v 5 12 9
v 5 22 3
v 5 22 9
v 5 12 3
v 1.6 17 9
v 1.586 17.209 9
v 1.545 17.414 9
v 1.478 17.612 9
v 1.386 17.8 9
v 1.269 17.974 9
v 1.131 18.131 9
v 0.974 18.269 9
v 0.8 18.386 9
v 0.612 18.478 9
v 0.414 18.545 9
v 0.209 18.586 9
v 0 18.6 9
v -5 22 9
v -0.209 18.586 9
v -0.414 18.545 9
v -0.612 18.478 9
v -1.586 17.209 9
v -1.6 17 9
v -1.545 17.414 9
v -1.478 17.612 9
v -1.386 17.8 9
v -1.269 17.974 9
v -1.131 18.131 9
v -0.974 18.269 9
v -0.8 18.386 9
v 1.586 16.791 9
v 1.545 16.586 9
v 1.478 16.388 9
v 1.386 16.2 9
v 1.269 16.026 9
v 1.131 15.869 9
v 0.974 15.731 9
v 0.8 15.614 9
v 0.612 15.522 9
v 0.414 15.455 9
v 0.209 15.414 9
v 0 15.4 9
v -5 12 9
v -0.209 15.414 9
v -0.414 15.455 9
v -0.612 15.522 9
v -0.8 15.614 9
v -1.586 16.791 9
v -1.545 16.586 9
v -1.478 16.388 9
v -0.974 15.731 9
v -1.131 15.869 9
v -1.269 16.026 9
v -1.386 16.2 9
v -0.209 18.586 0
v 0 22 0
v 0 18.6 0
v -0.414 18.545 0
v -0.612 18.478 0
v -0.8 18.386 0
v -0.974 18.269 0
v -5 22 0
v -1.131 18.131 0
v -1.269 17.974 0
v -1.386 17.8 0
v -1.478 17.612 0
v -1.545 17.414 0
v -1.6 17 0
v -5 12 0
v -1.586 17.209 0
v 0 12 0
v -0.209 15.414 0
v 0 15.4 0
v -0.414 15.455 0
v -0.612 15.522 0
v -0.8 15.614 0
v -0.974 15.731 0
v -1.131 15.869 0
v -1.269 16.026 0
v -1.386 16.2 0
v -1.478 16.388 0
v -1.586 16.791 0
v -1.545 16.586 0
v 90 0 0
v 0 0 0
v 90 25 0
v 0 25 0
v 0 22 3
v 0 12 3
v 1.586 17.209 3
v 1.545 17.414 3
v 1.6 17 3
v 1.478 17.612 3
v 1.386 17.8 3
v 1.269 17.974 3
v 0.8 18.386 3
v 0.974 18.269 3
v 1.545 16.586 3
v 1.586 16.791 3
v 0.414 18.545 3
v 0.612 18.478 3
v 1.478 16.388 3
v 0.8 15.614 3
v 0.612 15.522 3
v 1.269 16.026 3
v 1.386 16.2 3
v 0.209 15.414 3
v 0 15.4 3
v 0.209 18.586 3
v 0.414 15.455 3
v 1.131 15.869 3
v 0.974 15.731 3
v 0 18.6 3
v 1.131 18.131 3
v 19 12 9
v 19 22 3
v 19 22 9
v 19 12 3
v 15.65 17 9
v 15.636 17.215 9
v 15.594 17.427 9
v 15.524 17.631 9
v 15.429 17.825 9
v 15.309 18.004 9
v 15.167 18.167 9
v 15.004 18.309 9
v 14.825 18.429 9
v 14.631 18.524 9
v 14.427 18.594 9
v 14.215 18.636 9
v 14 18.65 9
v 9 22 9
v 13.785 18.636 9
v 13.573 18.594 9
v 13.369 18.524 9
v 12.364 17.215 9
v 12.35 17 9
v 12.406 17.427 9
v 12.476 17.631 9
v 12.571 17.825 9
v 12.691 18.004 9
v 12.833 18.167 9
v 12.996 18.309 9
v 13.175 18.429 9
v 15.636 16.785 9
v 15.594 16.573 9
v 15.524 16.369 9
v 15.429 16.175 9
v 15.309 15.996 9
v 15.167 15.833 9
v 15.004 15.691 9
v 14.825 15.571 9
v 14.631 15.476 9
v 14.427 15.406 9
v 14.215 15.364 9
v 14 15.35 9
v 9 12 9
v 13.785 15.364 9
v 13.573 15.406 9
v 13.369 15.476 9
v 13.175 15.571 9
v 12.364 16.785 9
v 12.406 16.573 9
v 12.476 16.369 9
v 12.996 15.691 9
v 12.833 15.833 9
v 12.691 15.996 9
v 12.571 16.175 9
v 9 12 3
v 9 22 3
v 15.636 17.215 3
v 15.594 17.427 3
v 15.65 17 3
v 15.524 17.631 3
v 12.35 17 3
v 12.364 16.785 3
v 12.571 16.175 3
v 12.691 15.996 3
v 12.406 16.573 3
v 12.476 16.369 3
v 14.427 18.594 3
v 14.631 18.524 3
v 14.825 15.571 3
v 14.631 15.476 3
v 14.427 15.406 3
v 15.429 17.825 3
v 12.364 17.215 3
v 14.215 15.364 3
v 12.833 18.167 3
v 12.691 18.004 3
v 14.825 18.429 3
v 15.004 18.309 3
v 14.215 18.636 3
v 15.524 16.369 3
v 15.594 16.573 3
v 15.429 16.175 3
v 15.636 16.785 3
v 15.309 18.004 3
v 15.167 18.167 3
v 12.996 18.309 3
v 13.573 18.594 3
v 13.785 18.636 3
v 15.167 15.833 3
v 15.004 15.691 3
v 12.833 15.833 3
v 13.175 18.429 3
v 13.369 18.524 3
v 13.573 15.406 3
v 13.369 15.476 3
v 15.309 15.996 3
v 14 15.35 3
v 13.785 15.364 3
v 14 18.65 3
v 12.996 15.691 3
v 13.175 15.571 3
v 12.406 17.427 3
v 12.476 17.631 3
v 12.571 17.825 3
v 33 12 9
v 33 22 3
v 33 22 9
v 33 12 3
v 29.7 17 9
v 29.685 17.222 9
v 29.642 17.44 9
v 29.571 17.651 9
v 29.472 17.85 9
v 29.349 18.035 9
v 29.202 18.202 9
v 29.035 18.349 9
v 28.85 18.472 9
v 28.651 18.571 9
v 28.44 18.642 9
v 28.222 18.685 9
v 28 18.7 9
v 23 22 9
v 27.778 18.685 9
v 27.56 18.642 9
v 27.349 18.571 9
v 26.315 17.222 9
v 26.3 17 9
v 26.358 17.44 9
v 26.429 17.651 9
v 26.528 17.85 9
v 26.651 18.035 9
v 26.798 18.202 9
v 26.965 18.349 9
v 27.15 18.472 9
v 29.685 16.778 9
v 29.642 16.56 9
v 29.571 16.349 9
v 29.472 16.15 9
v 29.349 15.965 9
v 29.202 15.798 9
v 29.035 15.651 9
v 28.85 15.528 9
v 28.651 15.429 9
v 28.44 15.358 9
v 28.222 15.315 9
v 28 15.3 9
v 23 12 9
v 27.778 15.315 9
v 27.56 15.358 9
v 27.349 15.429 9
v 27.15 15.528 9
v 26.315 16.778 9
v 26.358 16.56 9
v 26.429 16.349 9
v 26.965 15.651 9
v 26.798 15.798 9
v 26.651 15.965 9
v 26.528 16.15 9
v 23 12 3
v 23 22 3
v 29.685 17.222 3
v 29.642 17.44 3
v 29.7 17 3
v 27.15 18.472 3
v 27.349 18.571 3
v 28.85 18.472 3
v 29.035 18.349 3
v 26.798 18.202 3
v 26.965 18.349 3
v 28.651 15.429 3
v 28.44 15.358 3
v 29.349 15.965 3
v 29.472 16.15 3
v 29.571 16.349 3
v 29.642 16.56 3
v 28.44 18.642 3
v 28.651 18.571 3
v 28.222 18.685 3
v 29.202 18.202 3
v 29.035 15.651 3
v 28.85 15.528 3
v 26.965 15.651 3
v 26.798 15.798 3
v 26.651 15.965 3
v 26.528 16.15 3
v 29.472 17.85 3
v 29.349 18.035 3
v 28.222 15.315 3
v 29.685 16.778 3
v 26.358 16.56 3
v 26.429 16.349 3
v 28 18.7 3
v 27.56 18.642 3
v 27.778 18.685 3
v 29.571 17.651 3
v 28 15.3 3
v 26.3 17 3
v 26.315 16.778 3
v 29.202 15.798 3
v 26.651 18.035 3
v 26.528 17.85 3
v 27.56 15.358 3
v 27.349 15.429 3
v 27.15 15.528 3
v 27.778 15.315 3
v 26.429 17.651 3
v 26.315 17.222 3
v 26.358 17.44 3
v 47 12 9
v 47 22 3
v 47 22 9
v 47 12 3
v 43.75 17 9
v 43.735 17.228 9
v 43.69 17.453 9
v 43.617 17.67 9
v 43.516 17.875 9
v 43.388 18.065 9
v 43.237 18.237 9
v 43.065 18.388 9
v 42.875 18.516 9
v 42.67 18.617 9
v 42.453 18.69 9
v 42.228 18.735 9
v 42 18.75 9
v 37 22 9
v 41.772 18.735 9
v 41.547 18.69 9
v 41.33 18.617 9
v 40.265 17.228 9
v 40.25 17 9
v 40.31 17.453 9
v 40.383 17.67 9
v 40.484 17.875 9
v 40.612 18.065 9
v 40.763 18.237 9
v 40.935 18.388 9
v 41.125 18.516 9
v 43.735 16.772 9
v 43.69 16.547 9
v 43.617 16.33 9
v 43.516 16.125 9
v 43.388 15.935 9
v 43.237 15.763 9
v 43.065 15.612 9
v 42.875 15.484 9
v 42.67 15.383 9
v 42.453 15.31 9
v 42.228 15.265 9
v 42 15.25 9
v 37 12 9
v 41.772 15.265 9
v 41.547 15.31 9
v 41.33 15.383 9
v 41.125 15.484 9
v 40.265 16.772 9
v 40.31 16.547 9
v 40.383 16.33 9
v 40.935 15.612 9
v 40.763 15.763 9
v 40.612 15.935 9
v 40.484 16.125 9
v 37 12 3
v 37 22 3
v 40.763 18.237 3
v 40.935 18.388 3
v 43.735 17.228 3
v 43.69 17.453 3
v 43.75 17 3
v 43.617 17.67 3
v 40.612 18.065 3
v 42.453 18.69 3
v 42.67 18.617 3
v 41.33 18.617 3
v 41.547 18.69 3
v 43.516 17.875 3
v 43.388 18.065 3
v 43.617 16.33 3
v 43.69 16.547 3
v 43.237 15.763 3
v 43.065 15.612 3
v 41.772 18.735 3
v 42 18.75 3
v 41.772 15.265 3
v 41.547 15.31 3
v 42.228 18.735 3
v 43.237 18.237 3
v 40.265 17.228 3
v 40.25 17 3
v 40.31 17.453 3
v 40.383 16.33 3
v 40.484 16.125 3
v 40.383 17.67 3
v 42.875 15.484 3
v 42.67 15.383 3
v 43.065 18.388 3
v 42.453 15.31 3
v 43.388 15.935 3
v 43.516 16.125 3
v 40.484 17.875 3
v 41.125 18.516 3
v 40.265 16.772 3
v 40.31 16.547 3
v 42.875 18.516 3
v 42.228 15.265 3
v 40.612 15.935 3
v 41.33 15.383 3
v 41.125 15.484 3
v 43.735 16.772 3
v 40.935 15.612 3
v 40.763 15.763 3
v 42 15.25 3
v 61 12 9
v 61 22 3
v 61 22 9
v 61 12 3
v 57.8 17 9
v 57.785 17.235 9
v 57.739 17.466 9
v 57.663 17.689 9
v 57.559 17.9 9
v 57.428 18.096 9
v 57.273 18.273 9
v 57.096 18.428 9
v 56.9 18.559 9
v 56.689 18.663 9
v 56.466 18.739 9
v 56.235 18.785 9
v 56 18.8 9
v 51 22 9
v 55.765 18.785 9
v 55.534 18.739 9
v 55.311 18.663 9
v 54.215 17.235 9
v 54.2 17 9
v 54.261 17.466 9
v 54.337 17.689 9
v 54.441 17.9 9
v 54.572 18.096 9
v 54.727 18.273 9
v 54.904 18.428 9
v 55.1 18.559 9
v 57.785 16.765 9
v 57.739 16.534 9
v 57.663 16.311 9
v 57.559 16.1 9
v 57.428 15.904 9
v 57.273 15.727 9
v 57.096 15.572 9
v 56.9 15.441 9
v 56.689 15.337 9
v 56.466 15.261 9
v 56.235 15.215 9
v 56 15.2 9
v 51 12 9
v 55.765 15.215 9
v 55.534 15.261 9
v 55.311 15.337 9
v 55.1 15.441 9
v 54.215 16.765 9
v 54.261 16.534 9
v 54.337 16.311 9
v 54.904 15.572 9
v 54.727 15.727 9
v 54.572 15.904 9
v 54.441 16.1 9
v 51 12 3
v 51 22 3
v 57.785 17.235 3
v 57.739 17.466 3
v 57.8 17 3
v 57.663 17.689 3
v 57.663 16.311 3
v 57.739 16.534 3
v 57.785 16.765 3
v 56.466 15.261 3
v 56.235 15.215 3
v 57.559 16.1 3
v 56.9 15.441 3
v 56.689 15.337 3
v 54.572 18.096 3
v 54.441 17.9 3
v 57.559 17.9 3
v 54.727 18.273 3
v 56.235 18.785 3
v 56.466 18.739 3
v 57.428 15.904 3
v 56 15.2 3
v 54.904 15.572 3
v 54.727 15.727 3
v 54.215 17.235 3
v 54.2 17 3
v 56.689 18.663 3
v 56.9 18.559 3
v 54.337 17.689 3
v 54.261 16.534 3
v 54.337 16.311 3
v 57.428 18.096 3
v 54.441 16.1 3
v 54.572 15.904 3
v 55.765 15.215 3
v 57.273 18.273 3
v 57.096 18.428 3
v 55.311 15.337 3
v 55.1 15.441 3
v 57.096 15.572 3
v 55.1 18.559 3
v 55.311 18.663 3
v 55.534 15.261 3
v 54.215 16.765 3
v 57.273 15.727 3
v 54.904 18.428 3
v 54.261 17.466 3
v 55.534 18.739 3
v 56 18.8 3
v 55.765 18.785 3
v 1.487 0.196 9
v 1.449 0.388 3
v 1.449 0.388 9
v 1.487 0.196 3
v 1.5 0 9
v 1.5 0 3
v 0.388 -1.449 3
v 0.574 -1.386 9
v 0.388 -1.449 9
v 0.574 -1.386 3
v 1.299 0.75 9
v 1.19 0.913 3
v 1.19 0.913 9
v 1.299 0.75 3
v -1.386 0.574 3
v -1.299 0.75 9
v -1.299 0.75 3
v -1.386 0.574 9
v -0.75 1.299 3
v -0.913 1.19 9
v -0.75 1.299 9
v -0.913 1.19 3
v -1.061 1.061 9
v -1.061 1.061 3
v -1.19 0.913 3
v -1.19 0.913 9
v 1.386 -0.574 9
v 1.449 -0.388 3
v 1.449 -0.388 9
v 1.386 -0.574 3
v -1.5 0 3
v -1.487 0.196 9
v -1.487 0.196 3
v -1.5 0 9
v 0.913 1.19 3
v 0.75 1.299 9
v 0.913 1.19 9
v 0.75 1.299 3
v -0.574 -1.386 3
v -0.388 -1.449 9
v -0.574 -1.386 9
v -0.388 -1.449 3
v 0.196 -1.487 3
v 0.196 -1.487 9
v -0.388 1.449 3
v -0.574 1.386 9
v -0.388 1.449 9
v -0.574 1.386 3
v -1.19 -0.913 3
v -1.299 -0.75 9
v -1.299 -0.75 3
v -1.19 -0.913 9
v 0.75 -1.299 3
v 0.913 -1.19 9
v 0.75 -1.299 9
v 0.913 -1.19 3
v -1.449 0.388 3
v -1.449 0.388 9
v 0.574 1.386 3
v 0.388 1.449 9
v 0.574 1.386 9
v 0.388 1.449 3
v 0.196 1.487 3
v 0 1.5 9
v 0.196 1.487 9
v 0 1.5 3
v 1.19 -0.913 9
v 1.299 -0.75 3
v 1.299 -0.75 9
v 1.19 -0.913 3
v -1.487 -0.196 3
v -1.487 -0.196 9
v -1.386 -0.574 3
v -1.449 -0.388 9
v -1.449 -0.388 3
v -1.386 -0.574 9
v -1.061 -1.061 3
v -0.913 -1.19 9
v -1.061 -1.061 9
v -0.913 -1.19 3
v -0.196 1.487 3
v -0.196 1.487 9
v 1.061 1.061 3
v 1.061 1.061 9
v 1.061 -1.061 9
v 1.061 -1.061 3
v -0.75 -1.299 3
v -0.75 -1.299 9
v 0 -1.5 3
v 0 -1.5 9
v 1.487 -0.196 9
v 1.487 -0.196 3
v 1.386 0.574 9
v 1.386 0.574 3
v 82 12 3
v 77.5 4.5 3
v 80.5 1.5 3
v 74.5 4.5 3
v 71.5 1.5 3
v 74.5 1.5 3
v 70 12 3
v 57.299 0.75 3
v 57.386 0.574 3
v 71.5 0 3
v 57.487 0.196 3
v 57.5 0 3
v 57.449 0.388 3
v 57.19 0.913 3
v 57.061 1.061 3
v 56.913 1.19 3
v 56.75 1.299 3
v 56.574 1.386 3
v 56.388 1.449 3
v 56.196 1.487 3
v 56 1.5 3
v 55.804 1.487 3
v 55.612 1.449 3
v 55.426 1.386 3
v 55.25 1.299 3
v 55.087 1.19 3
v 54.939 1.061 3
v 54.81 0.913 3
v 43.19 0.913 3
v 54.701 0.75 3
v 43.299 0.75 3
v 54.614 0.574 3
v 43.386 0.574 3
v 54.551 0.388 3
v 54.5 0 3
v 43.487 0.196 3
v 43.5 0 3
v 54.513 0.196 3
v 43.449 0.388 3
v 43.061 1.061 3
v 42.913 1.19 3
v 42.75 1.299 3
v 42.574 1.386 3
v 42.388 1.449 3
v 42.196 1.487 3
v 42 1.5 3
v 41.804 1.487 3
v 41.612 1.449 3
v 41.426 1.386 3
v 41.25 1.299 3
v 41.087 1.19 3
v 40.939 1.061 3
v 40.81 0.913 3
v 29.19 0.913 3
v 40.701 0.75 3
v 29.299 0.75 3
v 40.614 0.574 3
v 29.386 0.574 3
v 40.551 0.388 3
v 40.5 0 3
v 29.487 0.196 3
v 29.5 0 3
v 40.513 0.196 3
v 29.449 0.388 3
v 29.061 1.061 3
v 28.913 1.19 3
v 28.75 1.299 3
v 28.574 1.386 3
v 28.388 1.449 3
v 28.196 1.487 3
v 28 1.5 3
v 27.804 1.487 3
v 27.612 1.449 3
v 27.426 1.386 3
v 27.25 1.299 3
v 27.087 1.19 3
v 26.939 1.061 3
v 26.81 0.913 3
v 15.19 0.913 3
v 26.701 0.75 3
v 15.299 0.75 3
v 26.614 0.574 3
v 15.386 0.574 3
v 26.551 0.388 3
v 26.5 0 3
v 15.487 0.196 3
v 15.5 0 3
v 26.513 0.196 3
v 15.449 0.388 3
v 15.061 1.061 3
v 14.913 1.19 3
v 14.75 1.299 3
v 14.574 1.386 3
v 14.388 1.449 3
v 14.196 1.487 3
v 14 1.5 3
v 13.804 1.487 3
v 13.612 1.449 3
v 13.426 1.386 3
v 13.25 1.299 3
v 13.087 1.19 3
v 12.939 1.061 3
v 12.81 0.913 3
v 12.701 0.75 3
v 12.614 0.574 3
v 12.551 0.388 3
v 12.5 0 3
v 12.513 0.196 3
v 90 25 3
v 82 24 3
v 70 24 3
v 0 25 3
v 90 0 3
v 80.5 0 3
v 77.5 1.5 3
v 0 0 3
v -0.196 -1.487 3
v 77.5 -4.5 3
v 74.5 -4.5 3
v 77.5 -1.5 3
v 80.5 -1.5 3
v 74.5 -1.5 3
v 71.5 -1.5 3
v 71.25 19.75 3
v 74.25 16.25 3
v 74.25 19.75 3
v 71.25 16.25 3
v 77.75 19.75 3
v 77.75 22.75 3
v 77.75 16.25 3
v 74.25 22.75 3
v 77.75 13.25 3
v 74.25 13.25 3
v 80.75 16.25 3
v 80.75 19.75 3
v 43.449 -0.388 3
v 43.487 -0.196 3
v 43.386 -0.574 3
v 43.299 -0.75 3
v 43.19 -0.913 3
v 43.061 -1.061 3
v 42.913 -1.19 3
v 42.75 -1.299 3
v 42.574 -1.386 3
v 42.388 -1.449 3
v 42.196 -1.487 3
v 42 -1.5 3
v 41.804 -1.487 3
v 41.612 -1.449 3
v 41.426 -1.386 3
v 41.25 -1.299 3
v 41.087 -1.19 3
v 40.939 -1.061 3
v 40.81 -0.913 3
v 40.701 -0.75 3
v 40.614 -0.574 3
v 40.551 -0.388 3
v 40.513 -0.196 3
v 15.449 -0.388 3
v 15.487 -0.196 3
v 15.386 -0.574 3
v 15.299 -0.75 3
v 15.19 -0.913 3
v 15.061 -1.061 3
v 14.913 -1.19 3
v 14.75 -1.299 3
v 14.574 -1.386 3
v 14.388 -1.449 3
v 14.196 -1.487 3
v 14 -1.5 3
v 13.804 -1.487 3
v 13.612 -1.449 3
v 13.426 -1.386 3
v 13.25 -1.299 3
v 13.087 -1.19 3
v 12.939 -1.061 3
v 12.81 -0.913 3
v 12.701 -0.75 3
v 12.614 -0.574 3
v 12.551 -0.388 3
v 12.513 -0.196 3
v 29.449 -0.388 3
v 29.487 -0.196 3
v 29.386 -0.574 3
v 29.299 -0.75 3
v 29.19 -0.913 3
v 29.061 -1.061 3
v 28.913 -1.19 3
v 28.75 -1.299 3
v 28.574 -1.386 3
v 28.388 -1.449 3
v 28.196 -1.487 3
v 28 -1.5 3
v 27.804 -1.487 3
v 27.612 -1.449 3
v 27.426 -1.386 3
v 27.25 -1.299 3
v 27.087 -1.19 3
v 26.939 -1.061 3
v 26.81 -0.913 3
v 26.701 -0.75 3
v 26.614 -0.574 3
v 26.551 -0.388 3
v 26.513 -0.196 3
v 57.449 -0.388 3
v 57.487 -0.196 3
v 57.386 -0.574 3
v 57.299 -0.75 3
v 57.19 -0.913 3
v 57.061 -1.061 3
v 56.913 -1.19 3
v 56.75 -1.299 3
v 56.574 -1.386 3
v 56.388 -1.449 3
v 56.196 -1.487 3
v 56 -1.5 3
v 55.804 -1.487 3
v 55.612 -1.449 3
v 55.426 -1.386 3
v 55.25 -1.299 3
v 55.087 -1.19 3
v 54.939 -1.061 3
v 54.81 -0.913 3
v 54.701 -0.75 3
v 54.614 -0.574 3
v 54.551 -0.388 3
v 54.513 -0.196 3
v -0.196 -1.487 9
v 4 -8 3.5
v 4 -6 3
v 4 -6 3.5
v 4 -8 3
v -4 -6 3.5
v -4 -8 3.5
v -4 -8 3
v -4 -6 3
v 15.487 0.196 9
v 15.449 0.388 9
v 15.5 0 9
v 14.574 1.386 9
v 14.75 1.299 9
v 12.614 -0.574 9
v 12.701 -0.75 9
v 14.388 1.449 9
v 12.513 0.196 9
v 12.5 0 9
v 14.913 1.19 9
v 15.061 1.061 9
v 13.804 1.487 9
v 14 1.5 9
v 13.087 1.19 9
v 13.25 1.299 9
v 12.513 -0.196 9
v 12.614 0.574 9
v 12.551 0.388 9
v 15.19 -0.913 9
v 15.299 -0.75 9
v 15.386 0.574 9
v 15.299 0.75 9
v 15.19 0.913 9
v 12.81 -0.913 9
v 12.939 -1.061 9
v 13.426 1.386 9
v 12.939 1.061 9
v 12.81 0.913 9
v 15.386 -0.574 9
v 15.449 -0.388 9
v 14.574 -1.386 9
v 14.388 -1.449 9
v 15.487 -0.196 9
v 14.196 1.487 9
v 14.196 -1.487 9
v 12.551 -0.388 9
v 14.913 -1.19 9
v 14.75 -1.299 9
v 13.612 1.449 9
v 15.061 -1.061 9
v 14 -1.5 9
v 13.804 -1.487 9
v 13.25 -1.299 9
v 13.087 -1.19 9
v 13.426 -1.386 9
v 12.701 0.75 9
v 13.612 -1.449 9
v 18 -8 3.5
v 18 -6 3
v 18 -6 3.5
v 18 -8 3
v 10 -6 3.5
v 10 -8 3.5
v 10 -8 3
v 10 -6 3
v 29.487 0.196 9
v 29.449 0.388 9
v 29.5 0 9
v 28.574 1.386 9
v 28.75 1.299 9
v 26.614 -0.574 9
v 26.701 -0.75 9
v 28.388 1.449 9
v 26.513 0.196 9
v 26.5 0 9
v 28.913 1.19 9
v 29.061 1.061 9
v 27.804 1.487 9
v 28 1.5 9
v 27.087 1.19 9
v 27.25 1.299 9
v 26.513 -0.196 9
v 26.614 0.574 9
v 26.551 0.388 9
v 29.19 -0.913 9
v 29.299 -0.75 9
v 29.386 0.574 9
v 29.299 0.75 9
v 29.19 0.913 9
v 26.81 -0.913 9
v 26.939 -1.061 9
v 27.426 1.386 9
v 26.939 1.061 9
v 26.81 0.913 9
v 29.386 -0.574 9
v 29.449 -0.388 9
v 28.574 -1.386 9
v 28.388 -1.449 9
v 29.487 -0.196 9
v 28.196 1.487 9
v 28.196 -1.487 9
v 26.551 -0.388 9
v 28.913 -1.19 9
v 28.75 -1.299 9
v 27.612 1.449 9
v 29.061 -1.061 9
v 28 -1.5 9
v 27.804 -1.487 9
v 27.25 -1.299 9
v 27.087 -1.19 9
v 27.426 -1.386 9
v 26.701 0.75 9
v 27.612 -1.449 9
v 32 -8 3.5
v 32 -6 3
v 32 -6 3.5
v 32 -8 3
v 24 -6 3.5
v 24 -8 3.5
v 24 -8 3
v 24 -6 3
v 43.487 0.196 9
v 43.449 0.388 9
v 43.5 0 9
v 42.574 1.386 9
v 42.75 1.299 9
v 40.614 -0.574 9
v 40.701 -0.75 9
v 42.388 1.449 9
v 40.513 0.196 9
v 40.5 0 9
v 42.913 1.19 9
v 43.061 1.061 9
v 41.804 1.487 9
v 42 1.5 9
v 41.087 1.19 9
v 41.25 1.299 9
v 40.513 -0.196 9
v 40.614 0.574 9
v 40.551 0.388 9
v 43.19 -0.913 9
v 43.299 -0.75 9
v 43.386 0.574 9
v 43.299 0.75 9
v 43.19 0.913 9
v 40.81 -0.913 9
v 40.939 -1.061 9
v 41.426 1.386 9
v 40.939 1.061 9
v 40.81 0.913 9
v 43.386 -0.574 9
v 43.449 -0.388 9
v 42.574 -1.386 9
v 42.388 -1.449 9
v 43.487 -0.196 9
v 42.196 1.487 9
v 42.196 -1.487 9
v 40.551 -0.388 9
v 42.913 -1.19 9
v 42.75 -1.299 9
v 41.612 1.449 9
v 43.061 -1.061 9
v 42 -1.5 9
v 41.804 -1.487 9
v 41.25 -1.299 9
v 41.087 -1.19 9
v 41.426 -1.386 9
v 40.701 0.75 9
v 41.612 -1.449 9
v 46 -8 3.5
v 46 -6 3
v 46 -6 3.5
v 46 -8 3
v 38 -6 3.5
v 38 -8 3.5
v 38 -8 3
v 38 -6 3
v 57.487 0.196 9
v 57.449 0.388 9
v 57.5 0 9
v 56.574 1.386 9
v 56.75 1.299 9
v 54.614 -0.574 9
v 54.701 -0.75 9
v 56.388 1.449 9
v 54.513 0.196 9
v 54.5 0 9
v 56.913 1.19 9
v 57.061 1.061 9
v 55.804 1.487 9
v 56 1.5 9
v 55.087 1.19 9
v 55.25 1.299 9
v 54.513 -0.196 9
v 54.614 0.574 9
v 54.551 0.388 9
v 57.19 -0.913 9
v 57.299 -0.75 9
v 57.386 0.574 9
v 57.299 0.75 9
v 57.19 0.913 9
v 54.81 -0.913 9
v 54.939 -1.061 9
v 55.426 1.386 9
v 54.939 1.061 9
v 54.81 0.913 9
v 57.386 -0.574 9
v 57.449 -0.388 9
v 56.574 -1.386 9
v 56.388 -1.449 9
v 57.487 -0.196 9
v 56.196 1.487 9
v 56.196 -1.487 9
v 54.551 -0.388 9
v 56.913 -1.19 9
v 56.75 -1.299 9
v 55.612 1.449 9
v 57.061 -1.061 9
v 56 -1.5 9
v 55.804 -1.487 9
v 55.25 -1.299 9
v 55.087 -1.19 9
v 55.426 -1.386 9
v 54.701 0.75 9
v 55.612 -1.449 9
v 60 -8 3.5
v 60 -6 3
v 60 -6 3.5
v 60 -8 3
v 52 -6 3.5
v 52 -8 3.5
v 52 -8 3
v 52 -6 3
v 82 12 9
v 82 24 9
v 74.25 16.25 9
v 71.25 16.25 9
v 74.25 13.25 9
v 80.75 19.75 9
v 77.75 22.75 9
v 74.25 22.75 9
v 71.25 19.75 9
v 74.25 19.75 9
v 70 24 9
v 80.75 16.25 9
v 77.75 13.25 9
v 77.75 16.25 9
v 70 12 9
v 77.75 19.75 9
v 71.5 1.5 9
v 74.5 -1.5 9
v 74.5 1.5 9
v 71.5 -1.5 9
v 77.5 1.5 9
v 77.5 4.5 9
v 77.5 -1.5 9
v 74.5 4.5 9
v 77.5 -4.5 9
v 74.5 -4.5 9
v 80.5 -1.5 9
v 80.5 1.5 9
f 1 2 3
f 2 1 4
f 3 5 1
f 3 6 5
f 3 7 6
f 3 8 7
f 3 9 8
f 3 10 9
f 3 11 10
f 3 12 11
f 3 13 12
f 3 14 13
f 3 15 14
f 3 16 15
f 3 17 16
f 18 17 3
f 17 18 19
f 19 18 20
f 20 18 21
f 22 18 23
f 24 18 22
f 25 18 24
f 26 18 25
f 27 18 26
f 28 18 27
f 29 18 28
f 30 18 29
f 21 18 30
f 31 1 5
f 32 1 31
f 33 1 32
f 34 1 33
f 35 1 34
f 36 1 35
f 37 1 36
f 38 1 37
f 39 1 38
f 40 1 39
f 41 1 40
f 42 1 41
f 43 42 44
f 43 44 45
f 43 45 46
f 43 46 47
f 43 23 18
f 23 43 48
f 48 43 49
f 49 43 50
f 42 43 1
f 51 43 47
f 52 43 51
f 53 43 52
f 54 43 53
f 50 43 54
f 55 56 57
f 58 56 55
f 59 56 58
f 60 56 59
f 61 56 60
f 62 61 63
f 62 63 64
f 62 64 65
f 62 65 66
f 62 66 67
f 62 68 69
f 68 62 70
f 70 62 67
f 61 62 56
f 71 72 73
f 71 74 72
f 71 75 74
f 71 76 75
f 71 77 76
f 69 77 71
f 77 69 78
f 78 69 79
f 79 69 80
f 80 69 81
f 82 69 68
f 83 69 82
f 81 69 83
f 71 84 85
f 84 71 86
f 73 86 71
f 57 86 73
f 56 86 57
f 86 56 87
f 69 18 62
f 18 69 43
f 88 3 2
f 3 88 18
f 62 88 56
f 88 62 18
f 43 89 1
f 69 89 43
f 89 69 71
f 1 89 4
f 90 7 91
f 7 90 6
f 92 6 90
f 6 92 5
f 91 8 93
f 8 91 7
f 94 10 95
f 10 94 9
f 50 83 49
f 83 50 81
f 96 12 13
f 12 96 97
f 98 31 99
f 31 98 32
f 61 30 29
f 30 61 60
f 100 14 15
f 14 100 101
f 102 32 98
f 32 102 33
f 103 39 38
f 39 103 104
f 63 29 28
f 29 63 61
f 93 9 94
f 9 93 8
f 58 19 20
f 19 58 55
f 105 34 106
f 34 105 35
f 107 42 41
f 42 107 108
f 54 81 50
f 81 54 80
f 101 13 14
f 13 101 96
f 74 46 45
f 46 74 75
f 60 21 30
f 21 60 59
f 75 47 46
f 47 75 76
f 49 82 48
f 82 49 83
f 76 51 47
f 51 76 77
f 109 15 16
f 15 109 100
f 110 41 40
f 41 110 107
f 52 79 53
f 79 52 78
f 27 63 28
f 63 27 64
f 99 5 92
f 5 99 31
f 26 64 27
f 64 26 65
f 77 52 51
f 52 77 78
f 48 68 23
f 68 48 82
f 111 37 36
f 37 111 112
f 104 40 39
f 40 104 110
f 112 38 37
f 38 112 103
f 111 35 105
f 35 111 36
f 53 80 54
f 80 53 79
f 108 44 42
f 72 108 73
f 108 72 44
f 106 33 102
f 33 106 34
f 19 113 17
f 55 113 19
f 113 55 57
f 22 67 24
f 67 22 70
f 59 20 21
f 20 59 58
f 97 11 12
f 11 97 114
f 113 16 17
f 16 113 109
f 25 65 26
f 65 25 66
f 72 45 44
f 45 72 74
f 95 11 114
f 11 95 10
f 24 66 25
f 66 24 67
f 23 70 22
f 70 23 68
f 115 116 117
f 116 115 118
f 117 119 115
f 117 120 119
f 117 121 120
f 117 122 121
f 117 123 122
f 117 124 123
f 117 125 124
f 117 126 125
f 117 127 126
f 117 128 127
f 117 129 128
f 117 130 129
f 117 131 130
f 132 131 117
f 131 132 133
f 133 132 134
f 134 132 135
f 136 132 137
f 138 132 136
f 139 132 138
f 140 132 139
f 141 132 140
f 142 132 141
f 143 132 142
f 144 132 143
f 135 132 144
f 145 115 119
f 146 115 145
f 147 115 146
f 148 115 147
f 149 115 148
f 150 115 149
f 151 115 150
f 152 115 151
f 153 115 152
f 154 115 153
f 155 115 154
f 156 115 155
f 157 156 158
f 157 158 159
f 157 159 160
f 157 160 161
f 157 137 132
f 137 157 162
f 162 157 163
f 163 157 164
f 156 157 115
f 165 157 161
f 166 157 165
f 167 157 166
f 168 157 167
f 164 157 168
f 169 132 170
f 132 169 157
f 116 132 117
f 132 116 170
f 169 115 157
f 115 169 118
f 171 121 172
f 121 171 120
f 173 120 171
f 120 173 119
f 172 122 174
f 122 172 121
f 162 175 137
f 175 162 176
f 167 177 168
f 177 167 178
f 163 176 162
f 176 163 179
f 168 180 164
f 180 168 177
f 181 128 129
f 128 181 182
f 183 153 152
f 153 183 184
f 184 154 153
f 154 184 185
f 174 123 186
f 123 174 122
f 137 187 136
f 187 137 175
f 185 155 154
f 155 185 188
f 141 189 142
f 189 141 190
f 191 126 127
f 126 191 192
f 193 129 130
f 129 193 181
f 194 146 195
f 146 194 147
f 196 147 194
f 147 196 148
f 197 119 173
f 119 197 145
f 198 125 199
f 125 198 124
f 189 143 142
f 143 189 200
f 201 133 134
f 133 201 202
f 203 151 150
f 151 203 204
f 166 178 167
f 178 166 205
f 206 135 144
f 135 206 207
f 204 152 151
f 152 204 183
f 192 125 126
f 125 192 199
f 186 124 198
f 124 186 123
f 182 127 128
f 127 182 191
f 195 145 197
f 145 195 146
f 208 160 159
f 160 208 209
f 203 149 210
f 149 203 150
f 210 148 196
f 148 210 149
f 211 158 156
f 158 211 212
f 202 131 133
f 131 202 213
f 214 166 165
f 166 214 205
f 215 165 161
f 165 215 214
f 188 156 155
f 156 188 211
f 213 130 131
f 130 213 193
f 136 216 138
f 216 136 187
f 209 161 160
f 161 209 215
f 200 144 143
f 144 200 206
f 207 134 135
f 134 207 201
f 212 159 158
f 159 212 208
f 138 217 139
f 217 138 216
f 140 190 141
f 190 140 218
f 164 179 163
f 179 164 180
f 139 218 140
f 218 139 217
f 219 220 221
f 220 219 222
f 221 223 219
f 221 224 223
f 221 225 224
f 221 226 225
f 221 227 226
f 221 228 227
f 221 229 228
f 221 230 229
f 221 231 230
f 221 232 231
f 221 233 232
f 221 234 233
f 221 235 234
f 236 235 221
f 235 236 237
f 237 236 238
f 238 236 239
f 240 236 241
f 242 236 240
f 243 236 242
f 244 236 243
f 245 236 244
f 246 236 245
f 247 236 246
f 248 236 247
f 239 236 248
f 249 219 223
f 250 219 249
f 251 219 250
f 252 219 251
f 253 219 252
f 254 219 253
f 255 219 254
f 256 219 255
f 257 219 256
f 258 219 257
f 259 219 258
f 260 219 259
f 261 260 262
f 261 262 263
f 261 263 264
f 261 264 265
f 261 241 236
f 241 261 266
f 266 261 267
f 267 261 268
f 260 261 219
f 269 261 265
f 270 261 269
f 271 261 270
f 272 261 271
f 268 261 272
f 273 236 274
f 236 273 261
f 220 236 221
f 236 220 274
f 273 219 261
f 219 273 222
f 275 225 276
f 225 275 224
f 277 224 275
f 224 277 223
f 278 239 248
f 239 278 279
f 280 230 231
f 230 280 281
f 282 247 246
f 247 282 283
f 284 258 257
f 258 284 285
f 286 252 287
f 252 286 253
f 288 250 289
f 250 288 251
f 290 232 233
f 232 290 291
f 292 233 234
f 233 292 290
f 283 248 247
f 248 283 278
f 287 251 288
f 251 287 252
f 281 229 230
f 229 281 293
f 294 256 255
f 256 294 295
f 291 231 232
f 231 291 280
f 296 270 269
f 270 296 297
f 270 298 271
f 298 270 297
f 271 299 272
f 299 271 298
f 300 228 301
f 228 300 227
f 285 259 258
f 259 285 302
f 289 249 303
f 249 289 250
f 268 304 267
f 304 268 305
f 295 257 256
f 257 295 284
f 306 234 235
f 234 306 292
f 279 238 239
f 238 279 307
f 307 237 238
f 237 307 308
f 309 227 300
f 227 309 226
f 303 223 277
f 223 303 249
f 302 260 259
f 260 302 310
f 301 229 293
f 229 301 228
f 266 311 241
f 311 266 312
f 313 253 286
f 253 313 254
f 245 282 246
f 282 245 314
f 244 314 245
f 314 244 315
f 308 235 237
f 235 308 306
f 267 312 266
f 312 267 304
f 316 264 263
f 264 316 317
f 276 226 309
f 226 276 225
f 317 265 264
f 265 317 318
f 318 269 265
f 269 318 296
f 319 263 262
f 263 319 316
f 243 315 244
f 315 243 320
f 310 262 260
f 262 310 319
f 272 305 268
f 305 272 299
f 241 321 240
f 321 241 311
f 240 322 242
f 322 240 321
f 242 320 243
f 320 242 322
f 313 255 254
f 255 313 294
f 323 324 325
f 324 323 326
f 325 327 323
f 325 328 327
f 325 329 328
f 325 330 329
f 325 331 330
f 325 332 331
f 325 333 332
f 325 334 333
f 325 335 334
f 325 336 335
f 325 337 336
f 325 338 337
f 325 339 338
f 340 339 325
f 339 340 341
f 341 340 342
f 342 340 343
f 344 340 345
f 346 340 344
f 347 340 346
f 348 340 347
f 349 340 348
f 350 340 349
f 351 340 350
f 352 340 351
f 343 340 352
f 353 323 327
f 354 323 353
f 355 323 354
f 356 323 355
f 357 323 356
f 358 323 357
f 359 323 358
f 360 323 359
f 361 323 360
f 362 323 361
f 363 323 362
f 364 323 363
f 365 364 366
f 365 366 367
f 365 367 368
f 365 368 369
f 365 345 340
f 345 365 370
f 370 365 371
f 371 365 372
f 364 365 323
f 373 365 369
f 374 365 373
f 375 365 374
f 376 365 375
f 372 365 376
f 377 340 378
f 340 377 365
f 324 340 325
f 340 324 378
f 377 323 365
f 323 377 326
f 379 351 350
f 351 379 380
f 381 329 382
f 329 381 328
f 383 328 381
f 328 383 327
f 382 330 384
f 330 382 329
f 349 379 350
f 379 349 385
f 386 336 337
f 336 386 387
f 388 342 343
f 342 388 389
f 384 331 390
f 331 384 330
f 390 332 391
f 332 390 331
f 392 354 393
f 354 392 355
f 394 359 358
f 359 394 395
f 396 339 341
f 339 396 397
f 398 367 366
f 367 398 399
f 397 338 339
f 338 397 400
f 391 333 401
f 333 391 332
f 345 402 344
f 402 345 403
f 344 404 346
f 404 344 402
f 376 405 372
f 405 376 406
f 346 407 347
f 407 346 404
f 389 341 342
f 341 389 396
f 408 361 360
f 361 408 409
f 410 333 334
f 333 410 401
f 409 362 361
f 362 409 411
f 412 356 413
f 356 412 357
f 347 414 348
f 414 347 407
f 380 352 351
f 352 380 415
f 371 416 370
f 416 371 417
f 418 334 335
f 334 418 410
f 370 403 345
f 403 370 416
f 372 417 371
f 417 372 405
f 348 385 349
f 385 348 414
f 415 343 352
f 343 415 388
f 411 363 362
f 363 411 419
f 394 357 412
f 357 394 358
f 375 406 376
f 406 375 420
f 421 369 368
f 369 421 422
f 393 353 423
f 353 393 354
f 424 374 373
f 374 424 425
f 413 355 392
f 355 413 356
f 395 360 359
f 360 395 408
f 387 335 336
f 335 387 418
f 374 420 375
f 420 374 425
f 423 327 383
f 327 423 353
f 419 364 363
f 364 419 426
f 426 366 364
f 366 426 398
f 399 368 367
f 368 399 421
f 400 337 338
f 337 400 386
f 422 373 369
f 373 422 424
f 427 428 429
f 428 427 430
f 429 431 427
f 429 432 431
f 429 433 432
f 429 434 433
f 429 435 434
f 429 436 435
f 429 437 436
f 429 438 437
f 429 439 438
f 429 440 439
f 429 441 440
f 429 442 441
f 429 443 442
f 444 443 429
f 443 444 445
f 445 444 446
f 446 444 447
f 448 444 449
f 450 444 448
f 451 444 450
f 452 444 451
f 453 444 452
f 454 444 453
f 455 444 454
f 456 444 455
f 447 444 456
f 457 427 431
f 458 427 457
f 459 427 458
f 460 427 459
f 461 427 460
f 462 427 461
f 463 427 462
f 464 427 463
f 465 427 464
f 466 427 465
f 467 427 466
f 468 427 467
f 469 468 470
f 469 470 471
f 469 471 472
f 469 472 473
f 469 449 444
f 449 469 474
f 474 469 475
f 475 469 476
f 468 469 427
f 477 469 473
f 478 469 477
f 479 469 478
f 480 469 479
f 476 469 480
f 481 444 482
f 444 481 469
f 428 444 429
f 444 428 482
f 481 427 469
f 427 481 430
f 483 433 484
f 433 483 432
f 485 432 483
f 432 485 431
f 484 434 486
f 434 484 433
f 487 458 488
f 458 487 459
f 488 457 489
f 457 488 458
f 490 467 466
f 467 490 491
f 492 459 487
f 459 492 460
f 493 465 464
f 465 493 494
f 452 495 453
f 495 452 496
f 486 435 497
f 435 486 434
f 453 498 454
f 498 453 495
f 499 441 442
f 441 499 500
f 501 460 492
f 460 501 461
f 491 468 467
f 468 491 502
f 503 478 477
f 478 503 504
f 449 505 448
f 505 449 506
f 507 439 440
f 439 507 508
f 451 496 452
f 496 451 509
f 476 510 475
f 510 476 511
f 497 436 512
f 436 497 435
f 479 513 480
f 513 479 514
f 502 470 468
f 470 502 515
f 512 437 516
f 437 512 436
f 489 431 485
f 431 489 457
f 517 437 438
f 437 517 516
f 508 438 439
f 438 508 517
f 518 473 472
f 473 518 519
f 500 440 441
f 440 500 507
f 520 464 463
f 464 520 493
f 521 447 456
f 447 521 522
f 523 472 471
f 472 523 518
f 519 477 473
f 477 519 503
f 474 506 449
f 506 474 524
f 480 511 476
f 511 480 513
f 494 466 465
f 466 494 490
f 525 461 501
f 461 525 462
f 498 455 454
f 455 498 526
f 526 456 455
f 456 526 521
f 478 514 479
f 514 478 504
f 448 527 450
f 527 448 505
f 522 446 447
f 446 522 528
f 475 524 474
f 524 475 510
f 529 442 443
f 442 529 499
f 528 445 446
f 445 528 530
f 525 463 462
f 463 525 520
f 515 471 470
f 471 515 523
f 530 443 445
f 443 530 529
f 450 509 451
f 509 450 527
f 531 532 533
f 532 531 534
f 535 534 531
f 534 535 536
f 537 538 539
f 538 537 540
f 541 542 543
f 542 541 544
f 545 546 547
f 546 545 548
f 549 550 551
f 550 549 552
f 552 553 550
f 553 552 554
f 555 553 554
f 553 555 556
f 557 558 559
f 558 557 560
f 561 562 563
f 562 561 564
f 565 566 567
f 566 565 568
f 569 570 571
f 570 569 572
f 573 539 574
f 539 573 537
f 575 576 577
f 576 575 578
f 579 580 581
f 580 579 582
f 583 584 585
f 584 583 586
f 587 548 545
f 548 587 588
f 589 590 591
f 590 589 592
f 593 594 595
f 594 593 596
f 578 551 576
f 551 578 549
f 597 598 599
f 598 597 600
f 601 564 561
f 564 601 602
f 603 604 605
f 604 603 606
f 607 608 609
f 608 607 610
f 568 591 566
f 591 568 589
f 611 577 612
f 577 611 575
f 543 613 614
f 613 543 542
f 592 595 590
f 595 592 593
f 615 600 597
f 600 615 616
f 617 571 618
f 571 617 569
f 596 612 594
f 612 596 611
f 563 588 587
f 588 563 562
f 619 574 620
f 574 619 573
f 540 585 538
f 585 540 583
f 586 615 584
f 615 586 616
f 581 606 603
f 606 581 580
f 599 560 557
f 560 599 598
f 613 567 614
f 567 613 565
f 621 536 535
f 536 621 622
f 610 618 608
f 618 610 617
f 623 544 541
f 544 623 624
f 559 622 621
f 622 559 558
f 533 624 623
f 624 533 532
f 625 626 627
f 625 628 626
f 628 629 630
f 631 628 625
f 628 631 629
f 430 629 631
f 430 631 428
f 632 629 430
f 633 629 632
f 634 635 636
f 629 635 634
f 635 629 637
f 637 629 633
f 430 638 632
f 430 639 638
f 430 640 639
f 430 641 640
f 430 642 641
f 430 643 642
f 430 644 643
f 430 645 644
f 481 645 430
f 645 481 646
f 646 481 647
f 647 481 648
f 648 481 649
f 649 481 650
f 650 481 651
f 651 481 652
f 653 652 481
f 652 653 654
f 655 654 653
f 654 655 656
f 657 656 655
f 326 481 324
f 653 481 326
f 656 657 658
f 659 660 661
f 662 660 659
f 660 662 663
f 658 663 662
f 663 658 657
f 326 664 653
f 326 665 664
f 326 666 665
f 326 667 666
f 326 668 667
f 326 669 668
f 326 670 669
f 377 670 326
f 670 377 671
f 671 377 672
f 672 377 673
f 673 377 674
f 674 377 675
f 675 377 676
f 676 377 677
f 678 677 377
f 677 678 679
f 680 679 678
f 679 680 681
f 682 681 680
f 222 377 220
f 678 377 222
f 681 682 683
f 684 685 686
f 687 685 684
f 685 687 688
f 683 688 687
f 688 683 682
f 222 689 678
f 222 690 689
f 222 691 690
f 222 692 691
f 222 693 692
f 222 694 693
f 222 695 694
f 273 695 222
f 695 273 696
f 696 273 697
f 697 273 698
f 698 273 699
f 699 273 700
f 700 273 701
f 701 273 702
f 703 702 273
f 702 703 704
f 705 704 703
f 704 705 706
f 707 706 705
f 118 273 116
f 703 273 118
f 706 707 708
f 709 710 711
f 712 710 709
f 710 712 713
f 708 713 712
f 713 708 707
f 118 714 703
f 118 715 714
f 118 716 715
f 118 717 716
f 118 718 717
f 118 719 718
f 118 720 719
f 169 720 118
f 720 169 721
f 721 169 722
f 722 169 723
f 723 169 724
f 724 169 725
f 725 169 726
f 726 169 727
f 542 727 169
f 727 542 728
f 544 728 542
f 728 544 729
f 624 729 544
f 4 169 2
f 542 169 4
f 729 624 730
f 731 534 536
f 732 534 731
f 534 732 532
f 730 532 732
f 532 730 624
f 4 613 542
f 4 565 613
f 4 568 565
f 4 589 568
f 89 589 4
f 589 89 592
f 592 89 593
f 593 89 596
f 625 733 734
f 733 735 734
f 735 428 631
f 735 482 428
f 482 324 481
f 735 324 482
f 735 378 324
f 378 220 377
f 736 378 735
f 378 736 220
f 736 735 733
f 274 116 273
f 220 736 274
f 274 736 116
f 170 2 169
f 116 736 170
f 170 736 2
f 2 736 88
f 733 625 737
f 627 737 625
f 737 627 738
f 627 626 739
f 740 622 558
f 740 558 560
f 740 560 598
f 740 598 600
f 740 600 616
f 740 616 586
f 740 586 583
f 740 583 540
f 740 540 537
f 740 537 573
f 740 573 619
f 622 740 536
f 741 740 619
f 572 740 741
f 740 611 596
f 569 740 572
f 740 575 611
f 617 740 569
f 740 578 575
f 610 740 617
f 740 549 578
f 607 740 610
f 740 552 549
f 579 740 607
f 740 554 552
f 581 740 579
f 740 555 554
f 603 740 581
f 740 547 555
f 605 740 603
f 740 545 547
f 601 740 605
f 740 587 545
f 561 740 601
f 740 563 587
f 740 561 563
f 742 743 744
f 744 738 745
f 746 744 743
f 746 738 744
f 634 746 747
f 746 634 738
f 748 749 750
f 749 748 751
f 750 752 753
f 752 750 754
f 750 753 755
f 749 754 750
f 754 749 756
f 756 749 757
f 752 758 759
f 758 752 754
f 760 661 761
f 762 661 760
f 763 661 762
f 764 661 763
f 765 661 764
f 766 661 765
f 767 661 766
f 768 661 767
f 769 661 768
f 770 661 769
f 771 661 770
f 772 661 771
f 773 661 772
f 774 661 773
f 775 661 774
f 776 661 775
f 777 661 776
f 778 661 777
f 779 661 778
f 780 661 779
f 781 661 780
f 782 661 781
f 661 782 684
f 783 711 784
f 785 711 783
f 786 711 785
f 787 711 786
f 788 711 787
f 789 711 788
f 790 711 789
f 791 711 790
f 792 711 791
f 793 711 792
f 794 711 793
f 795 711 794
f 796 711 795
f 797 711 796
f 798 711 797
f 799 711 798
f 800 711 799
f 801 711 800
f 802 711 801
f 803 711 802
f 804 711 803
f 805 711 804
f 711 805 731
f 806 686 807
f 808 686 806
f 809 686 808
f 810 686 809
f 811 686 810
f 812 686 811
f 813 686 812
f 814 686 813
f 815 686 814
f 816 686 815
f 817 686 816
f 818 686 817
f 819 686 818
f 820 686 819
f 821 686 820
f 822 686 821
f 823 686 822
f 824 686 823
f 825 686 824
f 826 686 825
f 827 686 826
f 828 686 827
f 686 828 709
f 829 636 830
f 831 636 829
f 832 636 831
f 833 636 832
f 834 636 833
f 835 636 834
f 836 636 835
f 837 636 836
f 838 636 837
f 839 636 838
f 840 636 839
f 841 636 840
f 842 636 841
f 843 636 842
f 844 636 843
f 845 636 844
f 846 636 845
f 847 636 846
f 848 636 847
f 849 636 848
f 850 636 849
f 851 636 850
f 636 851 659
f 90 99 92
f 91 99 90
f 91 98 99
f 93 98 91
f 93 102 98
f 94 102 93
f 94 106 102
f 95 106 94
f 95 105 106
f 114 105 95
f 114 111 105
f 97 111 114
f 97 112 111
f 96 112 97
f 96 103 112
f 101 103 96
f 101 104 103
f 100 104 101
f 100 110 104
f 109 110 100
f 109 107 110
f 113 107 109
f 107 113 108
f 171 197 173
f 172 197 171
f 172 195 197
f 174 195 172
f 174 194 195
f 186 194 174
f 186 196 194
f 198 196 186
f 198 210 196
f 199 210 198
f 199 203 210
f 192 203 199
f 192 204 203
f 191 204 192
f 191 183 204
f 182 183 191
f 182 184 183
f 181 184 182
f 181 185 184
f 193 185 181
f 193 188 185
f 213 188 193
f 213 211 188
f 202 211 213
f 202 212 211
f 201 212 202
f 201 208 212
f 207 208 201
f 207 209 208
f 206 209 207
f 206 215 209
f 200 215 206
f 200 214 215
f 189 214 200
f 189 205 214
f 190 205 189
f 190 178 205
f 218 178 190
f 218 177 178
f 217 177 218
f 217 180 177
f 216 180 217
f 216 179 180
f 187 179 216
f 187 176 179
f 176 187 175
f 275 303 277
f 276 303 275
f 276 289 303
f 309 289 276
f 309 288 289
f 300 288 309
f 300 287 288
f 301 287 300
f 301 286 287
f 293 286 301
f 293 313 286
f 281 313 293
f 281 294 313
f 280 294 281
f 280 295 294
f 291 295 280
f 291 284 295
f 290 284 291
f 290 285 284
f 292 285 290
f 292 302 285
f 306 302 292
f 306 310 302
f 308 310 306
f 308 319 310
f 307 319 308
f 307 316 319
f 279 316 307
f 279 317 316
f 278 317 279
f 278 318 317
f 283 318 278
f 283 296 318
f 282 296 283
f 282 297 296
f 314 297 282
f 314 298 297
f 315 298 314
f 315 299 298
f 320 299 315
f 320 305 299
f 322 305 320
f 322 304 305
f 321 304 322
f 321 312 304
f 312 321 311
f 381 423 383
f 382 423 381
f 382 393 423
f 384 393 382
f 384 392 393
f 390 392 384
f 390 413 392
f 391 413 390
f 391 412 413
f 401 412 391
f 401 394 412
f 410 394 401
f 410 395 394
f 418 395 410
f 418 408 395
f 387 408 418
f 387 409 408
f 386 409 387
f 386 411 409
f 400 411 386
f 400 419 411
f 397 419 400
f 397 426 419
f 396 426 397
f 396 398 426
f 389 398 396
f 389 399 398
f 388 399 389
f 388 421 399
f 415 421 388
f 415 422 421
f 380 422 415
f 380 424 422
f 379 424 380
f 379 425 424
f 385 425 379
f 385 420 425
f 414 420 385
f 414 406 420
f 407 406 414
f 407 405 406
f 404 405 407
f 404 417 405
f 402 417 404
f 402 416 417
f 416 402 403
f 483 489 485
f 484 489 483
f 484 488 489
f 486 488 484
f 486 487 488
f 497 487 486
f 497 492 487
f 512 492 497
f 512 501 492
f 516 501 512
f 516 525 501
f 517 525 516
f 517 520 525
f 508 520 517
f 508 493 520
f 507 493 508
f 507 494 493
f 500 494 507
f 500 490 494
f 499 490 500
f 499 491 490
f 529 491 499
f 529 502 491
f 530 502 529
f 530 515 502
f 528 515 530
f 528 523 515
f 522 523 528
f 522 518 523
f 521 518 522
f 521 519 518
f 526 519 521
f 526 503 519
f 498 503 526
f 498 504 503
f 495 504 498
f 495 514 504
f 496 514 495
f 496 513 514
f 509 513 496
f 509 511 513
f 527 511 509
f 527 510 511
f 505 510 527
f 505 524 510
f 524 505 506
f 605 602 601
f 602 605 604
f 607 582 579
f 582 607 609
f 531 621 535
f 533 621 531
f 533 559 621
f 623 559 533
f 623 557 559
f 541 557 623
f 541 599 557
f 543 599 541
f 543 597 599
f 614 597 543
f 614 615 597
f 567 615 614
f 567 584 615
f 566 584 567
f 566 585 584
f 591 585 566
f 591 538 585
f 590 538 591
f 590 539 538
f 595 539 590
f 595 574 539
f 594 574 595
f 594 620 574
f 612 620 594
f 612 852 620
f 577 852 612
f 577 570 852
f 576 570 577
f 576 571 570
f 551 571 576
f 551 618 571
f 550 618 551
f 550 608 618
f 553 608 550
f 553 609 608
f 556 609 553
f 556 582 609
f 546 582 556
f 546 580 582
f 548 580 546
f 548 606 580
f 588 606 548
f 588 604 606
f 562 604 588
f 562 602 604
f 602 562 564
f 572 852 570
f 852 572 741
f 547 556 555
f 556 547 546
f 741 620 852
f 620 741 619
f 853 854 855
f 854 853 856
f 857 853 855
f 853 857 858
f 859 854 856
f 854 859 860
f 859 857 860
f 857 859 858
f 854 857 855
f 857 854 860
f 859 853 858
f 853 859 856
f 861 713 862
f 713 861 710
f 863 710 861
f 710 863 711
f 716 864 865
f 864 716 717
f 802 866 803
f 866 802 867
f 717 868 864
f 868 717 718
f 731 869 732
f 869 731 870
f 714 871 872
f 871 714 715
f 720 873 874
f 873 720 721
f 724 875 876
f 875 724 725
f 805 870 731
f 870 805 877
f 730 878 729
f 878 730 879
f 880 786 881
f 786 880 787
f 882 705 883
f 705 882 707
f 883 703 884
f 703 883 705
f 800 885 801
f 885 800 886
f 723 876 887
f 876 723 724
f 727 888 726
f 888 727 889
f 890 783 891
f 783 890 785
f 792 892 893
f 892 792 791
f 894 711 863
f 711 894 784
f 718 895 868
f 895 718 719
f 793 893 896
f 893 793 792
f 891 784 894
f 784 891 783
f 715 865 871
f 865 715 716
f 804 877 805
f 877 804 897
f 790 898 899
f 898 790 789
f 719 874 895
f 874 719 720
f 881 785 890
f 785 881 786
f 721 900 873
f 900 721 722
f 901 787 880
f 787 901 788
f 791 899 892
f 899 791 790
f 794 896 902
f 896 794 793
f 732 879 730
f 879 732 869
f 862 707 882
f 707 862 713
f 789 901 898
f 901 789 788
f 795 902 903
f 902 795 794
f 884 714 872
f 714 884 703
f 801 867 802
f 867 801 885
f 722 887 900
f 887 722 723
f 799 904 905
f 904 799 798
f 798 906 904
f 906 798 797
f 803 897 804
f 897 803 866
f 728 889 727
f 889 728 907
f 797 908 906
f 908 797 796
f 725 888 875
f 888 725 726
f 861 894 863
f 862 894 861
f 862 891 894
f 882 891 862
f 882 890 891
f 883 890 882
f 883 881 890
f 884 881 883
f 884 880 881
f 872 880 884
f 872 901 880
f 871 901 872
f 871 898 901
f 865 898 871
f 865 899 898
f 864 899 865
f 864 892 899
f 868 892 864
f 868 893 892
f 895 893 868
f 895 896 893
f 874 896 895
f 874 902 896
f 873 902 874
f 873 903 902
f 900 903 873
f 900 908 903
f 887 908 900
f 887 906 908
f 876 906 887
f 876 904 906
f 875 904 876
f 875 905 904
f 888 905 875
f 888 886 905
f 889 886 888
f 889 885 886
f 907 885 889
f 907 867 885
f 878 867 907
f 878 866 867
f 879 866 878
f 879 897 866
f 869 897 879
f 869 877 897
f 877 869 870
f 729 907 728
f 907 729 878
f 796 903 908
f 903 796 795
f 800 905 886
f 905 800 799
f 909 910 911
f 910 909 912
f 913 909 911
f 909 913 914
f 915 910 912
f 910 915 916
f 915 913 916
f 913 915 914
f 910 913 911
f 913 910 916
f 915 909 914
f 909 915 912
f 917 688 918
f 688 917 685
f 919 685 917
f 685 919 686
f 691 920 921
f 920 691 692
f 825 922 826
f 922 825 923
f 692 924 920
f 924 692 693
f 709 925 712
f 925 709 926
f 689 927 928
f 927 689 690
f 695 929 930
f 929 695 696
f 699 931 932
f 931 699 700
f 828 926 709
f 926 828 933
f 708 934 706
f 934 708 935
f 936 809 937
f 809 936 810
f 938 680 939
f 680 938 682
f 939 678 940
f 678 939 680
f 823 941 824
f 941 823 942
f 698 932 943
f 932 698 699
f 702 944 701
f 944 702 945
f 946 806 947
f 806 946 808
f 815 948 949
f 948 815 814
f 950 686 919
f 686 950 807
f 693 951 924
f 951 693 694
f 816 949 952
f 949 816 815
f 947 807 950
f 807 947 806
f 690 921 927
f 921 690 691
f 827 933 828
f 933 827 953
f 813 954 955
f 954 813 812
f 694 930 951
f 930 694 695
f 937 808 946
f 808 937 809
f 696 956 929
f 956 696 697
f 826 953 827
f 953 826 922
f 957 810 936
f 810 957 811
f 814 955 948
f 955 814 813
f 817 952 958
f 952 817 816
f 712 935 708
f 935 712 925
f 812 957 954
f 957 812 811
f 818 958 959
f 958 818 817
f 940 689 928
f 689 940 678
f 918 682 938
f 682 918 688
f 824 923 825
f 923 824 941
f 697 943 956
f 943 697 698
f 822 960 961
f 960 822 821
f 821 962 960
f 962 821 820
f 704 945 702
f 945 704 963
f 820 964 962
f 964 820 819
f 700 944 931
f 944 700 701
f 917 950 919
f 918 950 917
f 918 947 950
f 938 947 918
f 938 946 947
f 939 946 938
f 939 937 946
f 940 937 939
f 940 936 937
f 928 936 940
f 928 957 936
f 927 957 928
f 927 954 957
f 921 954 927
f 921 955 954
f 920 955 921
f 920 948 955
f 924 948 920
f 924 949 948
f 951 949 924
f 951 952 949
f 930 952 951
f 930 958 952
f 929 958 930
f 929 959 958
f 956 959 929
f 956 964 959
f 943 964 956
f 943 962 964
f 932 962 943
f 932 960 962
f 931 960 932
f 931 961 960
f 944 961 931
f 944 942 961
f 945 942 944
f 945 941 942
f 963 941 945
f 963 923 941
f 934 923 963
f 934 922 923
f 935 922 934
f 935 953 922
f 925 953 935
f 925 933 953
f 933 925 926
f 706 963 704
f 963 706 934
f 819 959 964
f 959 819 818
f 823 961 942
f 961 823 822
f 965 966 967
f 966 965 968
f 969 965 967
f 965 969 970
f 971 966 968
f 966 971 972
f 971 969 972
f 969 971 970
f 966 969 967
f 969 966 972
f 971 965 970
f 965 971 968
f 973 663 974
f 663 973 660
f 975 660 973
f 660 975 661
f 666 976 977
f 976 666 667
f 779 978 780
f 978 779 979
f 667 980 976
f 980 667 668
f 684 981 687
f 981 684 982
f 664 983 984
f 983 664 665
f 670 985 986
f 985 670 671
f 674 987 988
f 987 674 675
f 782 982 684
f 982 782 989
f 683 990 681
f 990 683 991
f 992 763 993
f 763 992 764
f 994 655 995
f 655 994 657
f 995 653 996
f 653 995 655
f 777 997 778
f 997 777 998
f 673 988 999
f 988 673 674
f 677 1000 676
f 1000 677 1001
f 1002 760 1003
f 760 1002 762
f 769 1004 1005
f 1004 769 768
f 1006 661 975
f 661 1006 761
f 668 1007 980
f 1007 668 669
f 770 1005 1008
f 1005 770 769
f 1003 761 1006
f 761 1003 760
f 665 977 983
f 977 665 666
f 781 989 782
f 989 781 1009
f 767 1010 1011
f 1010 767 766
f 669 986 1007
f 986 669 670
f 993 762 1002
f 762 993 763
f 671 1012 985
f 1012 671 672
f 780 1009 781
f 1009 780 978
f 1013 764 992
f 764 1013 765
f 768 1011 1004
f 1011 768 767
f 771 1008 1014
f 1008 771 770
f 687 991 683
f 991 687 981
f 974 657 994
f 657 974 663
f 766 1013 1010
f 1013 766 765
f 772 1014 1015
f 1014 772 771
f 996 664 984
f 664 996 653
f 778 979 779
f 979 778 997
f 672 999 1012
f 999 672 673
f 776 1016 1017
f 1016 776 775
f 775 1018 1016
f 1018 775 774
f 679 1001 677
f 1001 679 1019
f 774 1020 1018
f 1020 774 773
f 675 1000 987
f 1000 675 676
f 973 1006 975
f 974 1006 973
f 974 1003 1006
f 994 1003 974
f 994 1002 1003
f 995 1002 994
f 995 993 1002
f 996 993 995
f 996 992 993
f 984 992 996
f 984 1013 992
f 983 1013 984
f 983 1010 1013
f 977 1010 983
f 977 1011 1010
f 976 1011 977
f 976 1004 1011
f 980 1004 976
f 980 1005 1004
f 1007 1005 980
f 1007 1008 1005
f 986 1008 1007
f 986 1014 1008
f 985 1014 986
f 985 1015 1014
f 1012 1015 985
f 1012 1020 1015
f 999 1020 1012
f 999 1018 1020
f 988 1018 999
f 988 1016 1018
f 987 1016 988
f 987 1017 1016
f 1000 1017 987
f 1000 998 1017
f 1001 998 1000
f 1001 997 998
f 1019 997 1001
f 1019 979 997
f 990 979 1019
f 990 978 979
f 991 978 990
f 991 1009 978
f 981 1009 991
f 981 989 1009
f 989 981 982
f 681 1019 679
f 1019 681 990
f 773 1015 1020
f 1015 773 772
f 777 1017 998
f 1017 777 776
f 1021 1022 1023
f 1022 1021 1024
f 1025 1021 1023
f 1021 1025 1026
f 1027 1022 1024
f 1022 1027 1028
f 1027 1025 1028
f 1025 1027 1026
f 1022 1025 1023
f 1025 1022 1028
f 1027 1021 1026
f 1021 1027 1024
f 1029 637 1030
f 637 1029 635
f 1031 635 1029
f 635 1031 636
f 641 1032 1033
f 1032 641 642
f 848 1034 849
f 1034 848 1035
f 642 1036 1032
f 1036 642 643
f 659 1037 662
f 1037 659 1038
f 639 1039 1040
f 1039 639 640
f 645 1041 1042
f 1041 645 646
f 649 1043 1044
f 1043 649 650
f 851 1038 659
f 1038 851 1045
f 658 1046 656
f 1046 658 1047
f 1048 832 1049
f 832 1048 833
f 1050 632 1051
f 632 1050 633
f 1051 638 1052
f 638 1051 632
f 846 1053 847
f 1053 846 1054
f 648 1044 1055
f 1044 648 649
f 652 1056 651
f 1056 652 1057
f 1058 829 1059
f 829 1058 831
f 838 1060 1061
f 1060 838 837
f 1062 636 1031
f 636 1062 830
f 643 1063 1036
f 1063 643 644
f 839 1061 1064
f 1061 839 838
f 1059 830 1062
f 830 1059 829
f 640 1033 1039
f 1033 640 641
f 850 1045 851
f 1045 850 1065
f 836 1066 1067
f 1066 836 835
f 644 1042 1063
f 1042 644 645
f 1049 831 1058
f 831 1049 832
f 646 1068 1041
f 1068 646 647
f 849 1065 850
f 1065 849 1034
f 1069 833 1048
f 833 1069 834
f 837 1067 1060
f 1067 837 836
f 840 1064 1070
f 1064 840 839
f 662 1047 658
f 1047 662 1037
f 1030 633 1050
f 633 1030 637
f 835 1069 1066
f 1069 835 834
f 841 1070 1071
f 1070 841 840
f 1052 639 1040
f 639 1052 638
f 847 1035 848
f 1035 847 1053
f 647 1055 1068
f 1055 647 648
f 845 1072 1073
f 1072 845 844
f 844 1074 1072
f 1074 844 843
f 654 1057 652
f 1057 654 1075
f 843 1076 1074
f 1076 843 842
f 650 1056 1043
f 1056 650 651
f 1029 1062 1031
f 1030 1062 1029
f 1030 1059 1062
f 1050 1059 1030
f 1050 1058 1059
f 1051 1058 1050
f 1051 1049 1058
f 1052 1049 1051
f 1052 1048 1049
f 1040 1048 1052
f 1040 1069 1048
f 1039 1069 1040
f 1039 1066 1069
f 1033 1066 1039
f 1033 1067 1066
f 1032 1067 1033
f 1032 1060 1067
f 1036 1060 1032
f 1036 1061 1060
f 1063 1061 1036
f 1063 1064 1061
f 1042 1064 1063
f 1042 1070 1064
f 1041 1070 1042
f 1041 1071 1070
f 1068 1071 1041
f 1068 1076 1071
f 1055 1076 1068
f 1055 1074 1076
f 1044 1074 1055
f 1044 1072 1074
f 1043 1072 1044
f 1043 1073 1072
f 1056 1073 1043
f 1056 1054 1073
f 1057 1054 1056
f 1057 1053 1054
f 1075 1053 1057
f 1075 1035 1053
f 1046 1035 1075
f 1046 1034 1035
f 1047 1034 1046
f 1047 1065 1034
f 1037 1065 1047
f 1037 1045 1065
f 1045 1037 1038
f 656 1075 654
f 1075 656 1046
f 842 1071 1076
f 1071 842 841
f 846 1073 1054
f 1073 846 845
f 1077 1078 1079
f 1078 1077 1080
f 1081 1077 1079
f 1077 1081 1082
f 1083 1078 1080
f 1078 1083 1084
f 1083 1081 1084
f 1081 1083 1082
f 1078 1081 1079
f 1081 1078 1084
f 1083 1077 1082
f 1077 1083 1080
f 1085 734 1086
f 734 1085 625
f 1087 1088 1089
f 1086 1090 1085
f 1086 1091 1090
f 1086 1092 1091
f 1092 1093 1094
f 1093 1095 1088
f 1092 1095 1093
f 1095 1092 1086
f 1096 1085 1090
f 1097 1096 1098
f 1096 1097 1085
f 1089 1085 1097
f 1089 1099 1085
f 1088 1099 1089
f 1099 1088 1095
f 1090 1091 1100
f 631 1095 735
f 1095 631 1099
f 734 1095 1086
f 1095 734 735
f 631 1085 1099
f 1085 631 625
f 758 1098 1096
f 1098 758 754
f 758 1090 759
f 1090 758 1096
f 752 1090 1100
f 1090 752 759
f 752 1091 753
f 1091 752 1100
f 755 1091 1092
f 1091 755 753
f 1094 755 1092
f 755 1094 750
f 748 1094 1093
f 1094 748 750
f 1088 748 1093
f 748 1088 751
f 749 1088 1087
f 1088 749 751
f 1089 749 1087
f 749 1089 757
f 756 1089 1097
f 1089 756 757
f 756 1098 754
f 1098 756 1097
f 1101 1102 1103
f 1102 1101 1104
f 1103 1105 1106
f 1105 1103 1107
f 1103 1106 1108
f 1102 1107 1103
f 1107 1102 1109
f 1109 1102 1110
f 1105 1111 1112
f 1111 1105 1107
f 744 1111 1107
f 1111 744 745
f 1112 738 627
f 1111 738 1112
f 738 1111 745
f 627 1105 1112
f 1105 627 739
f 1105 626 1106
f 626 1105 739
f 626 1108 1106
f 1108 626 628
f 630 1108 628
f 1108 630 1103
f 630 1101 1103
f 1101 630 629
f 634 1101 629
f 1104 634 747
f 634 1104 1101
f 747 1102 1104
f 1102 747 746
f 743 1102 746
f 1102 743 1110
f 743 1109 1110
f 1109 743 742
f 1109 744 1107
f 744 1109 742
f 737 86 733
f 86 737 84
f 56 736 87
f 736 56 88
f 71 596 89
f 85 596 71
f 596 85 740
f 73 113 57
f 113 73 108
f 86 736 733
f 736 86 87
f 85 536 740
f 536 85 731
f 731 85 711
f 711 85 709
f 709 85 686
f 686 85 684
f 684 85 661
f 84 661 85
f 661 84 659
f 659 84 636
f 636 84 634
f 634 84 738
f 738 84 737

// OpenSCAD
// Project Mater v1.5 - FDM Fit Coupon
// Print this before finalizing CAD. Units: mm.
// Tests peg/hole diametral clearances and a small keyed calyx-style fit.

$fn = 48;
base_t = 3;
peg_d = 3.0;
clearances = [0.10, 0.15, 0.20, 0.25, 0.30];

module label_bar(x, txt_index) {
    translate([x-4,-8,base_t]) cube([8,2,0.5]);
}

module peg_row() {
    for (i=[0:len(clearances)-1]) {
        x = i*14;
        translate([x,0,base_t]) cylinder(h=6,d=peg_d);
        // Matching hole block placed behind peg
        translate([x-5,12,0])
        difference() {
            cube([10,10,9]);
            translate([5,5,-0.1])
                cylinder(h=10,d=peg_d+2*clearances[i]);
        }
        label_bar(x,i);
    }
}

module keyed_peg() {
    // Cross-key coupon, representative of calyx connector
    translate([76,0,base_t])
    linear_extrude(height=6)
        union() {
            square([3,9],center=true);
            square([9,3],center=true);
        }

    translate([70,12,0])
    difference() {
        cube([12,12,9]);
        translate([6,6,-0.1])
        linear_extrude(height=10)
            offset(delta=0.25)
            union() {
                square([3,9],center=true);
                square([9,3],center=true);
            }
    }
}

union() {
    cube([90,25,base_t]);
    peg_row();
    keyed_peg();
}
